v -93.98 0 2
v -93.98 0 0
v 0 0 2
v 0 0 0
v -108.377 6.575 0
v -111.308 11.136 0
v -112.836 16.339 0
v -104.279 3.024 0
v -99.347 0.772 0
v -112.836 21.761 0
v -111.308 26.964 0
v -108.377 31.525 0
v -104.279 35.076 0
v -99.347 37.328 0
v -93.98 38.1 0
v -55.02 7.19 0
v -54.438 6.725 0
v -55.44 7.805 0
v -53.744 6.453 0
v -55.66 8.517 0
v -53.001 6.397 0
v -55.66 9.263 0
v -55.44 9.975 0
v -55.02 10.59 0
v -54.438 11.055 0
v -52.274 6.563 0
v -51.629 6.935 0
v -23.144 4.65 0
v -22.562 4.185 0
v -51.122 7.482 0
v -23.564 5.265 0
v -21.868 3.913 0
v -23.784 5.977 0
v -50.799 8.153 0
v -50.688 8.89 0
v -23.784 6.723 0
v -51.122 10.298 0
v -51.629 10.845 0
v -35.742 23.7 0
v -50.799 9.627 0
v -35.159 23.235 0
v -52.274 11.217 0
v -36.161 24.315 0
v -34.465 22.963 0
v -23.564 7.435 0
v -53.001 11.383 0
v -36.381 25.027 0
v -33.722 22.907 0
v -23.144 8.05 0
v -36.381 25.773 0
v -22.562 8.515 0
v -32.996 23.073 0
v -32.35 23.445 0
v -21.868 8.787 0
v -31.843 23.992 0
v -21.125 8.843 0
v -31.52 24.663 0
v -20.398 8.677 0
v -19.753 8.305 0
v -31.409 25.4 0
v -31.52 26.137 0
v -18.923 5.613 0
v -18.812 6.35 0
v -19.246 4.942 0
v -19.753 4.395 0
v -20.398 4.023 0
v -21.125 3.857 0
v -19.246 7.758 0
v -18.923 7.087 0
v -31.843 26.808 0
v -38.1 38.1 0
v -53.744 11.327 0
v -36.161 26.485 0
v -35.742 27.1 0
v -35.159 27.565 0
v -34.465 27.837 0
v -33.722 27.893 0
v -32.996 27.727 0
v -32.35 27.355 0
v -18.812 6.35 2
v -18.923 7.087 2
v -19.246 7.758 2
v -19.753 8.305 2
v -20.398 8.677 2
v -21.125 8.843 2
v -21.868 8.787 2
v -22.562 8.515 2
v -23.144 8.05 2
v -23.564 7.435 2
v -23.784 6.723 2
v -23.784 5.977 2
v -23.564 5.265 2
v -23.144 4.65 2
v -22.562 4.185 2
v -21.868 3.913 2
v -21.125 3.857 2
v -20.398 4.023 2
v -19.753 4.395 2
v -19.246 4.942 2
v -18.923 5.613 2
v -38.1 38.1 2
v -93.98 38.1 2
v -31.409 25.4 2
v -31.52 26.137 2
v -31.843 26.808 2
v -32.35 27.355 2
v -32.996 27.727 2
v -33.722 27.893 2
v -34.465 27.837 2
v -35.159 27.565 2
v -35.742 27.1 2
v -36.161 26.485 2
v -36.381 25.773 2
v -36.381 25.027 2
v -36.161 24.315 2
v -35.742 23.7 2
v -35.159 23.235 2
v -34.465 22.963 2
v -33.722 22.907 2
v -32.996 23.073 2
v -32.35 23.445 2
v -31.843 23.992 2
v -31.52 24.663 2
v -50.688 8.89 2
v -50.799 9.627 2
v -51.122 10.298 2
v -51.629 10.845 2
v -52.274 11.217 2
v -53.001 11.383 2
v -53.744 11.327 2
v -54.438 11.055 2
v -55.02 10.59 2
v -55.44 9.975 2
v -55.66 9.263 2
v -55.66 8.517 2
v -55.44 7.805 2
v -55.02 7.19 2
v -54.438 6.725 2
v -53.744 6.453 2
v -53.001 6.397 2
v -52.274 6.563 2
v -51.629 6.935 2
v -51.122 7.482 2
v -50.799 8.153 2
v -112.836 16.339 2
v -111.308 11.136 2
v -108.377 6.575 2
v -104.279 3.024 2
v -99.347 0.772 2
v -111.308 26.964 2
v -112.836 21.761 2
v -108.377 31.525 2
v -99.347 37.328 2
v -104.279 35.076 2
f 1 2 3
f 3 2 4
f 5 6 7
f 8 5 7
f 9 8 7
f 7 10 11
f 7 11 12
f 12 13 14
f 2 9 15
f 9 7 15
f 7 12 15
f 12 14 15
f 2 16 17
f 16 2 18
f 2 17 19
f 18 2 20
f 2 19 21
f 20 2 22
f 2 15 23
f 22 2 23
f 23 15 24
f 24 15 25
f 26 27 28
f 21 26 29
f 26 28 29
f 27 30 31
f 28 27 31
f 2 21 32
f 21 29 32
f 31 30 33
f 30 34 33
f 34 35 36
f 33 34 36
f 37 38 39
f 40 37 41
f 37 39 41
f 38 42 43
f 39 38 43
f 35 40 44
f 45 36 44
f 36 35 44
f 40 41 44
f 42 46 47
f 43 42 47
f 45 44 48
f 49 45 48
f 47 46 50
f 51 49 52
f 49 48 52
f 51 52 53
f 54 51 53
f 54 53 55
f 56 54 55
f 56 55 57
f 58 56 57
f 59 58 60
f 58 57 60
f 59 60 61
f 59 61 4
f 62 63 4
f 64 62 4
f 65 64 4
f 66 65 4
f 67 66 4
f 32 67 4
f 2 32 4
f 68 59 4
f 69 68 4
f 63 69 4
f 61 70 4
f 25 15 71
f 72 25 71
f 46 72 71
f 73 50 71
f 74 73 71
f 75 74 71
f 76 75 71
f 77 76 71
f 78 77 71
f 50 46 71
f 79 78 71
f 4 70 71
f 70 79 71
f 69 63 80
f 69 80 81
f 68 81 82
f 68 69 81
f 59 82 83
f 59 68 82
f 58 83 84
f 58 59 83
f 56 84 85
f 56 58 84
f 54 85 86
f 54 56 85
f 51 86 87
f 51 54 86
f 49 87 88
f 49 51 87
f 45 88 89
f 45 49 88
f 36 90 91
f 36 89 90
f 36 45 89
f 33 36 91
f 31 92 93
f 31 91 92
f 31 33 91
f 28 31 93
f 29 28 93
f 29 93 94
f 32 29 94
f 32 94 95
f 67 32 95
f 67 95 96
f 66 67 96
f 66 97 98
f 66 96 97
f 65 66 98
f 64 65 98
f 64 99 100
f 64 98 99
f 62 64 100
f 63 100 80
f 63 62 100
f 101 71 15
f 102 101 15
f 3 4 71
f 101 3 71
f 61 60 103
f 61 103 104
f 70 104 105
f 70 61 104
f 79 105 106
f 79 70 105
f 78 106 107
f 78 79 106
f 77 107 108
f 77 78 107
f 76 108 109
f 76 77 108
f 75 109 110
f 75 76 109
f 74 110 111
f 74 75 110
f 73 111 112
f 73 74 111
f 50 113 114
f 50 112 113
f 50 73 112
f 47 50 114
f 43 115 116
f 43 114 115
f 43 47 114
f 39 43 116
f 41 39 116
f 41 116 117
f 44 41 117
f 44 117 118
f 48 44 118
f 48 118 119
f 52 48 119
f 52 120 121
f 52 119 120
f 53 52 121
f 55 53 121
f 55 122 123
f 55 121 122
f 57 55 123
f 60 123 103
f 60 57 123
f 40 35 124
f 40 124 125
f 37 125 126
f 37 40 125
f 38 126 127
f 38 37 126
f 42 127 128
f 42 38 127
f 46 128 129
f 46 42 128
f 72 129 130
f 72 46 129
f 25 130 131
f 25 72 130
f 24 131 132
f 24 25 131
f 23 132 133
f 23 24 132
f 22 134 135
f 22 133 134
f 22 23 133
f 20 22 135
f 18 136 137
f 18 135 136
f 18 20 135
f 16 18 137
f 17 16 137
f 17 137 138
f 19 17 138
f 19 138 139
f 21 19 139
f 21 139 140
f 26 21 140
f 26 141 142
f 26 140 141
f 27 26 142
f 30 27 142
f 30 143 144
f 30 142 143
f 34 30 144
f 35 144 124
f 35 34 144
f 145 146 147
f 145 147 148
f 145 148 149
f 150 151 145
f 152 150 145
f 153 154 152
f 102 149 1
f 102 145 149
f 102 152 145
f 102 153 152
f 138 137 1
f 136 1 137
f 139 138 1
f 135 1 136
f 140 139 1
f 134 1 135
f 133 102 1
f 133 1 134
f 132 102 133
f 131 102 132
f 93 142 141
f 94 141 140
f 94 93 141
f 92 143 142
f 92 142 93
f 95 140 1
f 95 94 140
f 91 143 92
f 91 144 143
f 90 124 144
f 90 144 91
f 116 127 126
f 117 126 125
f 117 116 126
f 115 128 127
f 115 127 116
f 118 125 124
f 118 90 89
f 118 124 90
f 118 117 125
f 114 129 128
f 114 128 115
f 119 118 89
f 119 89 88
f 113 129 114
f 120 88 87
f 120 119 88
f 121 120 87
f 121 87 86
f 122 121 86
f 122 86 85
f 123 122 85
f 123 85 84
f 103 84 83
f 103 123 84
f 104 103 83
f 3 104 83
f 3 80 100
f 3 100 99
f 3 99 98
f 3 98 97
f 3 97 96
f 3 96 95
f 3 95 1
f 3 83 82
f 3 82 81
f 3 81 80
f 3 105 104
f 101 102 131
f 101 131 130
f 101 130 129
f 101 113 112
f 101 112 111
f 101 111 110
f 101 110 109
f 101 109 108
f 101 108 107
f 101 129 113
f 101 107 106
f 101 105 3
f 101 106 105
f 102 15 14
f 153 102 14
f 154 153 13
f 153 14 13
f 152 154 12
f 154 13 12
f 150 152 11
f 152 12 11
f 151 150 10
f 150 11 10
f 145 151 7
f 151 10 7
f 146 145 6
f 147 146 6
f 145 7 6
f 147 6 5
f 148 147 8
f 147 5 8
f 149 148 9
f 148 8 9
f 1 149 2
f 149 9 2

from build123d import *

# Parameters (mm, degrees)
BOSS_EXTRUDE1_DEPTH     = 2
CUT_EXTRUDE1_DEPTH      = 120.295393457
CUT_EXTRUDE1_DEPTH_BACK = 120.295393457
SKETCH2_R               = 2.5


with BuildPart() as part:
    # Sketch1 → Boss-Extrude1 (new body)
    with BuildSketch(Plane.XY):
        with BuildLine():
            Line((0, 0), (-38.1, 38.1))
            Line((-38.1, 38.1), (-93.98, 38.1))
            ThreePointArc((-93.98, 38.1), (-113.03, 19.05), (-93.98, 0))
            Line((-93.98, 0), (0, 0))
        make_face()
    extrude(amount=BOSS_EXTRUDE1_DEPTH)

    # Sketch2 → Cut-Extrude1 (cut, two sides: drawn at the far end of the back side and taken through both)
    with BuildSketch(Plane.XY.offset(2).offset(-CUT_EXTRUDE1_DEPTH_BACK)):
        with Locations((-53.1876, 8.89)):
            Circle(SKETCH2_R)
        with Locations((-21.311773075, 6.35)):
            Circle(SKETCH2_R)
        with Locations((-33.909, 25.4)):
            Circle(SKETCH2_R)
    extrude(amount=CUT_EXTRUDE1_DEPTH + CUT_EXTRUDE1_DEPTH_BACK, mode=Mode.SUBTRACT)


solid = part.part
